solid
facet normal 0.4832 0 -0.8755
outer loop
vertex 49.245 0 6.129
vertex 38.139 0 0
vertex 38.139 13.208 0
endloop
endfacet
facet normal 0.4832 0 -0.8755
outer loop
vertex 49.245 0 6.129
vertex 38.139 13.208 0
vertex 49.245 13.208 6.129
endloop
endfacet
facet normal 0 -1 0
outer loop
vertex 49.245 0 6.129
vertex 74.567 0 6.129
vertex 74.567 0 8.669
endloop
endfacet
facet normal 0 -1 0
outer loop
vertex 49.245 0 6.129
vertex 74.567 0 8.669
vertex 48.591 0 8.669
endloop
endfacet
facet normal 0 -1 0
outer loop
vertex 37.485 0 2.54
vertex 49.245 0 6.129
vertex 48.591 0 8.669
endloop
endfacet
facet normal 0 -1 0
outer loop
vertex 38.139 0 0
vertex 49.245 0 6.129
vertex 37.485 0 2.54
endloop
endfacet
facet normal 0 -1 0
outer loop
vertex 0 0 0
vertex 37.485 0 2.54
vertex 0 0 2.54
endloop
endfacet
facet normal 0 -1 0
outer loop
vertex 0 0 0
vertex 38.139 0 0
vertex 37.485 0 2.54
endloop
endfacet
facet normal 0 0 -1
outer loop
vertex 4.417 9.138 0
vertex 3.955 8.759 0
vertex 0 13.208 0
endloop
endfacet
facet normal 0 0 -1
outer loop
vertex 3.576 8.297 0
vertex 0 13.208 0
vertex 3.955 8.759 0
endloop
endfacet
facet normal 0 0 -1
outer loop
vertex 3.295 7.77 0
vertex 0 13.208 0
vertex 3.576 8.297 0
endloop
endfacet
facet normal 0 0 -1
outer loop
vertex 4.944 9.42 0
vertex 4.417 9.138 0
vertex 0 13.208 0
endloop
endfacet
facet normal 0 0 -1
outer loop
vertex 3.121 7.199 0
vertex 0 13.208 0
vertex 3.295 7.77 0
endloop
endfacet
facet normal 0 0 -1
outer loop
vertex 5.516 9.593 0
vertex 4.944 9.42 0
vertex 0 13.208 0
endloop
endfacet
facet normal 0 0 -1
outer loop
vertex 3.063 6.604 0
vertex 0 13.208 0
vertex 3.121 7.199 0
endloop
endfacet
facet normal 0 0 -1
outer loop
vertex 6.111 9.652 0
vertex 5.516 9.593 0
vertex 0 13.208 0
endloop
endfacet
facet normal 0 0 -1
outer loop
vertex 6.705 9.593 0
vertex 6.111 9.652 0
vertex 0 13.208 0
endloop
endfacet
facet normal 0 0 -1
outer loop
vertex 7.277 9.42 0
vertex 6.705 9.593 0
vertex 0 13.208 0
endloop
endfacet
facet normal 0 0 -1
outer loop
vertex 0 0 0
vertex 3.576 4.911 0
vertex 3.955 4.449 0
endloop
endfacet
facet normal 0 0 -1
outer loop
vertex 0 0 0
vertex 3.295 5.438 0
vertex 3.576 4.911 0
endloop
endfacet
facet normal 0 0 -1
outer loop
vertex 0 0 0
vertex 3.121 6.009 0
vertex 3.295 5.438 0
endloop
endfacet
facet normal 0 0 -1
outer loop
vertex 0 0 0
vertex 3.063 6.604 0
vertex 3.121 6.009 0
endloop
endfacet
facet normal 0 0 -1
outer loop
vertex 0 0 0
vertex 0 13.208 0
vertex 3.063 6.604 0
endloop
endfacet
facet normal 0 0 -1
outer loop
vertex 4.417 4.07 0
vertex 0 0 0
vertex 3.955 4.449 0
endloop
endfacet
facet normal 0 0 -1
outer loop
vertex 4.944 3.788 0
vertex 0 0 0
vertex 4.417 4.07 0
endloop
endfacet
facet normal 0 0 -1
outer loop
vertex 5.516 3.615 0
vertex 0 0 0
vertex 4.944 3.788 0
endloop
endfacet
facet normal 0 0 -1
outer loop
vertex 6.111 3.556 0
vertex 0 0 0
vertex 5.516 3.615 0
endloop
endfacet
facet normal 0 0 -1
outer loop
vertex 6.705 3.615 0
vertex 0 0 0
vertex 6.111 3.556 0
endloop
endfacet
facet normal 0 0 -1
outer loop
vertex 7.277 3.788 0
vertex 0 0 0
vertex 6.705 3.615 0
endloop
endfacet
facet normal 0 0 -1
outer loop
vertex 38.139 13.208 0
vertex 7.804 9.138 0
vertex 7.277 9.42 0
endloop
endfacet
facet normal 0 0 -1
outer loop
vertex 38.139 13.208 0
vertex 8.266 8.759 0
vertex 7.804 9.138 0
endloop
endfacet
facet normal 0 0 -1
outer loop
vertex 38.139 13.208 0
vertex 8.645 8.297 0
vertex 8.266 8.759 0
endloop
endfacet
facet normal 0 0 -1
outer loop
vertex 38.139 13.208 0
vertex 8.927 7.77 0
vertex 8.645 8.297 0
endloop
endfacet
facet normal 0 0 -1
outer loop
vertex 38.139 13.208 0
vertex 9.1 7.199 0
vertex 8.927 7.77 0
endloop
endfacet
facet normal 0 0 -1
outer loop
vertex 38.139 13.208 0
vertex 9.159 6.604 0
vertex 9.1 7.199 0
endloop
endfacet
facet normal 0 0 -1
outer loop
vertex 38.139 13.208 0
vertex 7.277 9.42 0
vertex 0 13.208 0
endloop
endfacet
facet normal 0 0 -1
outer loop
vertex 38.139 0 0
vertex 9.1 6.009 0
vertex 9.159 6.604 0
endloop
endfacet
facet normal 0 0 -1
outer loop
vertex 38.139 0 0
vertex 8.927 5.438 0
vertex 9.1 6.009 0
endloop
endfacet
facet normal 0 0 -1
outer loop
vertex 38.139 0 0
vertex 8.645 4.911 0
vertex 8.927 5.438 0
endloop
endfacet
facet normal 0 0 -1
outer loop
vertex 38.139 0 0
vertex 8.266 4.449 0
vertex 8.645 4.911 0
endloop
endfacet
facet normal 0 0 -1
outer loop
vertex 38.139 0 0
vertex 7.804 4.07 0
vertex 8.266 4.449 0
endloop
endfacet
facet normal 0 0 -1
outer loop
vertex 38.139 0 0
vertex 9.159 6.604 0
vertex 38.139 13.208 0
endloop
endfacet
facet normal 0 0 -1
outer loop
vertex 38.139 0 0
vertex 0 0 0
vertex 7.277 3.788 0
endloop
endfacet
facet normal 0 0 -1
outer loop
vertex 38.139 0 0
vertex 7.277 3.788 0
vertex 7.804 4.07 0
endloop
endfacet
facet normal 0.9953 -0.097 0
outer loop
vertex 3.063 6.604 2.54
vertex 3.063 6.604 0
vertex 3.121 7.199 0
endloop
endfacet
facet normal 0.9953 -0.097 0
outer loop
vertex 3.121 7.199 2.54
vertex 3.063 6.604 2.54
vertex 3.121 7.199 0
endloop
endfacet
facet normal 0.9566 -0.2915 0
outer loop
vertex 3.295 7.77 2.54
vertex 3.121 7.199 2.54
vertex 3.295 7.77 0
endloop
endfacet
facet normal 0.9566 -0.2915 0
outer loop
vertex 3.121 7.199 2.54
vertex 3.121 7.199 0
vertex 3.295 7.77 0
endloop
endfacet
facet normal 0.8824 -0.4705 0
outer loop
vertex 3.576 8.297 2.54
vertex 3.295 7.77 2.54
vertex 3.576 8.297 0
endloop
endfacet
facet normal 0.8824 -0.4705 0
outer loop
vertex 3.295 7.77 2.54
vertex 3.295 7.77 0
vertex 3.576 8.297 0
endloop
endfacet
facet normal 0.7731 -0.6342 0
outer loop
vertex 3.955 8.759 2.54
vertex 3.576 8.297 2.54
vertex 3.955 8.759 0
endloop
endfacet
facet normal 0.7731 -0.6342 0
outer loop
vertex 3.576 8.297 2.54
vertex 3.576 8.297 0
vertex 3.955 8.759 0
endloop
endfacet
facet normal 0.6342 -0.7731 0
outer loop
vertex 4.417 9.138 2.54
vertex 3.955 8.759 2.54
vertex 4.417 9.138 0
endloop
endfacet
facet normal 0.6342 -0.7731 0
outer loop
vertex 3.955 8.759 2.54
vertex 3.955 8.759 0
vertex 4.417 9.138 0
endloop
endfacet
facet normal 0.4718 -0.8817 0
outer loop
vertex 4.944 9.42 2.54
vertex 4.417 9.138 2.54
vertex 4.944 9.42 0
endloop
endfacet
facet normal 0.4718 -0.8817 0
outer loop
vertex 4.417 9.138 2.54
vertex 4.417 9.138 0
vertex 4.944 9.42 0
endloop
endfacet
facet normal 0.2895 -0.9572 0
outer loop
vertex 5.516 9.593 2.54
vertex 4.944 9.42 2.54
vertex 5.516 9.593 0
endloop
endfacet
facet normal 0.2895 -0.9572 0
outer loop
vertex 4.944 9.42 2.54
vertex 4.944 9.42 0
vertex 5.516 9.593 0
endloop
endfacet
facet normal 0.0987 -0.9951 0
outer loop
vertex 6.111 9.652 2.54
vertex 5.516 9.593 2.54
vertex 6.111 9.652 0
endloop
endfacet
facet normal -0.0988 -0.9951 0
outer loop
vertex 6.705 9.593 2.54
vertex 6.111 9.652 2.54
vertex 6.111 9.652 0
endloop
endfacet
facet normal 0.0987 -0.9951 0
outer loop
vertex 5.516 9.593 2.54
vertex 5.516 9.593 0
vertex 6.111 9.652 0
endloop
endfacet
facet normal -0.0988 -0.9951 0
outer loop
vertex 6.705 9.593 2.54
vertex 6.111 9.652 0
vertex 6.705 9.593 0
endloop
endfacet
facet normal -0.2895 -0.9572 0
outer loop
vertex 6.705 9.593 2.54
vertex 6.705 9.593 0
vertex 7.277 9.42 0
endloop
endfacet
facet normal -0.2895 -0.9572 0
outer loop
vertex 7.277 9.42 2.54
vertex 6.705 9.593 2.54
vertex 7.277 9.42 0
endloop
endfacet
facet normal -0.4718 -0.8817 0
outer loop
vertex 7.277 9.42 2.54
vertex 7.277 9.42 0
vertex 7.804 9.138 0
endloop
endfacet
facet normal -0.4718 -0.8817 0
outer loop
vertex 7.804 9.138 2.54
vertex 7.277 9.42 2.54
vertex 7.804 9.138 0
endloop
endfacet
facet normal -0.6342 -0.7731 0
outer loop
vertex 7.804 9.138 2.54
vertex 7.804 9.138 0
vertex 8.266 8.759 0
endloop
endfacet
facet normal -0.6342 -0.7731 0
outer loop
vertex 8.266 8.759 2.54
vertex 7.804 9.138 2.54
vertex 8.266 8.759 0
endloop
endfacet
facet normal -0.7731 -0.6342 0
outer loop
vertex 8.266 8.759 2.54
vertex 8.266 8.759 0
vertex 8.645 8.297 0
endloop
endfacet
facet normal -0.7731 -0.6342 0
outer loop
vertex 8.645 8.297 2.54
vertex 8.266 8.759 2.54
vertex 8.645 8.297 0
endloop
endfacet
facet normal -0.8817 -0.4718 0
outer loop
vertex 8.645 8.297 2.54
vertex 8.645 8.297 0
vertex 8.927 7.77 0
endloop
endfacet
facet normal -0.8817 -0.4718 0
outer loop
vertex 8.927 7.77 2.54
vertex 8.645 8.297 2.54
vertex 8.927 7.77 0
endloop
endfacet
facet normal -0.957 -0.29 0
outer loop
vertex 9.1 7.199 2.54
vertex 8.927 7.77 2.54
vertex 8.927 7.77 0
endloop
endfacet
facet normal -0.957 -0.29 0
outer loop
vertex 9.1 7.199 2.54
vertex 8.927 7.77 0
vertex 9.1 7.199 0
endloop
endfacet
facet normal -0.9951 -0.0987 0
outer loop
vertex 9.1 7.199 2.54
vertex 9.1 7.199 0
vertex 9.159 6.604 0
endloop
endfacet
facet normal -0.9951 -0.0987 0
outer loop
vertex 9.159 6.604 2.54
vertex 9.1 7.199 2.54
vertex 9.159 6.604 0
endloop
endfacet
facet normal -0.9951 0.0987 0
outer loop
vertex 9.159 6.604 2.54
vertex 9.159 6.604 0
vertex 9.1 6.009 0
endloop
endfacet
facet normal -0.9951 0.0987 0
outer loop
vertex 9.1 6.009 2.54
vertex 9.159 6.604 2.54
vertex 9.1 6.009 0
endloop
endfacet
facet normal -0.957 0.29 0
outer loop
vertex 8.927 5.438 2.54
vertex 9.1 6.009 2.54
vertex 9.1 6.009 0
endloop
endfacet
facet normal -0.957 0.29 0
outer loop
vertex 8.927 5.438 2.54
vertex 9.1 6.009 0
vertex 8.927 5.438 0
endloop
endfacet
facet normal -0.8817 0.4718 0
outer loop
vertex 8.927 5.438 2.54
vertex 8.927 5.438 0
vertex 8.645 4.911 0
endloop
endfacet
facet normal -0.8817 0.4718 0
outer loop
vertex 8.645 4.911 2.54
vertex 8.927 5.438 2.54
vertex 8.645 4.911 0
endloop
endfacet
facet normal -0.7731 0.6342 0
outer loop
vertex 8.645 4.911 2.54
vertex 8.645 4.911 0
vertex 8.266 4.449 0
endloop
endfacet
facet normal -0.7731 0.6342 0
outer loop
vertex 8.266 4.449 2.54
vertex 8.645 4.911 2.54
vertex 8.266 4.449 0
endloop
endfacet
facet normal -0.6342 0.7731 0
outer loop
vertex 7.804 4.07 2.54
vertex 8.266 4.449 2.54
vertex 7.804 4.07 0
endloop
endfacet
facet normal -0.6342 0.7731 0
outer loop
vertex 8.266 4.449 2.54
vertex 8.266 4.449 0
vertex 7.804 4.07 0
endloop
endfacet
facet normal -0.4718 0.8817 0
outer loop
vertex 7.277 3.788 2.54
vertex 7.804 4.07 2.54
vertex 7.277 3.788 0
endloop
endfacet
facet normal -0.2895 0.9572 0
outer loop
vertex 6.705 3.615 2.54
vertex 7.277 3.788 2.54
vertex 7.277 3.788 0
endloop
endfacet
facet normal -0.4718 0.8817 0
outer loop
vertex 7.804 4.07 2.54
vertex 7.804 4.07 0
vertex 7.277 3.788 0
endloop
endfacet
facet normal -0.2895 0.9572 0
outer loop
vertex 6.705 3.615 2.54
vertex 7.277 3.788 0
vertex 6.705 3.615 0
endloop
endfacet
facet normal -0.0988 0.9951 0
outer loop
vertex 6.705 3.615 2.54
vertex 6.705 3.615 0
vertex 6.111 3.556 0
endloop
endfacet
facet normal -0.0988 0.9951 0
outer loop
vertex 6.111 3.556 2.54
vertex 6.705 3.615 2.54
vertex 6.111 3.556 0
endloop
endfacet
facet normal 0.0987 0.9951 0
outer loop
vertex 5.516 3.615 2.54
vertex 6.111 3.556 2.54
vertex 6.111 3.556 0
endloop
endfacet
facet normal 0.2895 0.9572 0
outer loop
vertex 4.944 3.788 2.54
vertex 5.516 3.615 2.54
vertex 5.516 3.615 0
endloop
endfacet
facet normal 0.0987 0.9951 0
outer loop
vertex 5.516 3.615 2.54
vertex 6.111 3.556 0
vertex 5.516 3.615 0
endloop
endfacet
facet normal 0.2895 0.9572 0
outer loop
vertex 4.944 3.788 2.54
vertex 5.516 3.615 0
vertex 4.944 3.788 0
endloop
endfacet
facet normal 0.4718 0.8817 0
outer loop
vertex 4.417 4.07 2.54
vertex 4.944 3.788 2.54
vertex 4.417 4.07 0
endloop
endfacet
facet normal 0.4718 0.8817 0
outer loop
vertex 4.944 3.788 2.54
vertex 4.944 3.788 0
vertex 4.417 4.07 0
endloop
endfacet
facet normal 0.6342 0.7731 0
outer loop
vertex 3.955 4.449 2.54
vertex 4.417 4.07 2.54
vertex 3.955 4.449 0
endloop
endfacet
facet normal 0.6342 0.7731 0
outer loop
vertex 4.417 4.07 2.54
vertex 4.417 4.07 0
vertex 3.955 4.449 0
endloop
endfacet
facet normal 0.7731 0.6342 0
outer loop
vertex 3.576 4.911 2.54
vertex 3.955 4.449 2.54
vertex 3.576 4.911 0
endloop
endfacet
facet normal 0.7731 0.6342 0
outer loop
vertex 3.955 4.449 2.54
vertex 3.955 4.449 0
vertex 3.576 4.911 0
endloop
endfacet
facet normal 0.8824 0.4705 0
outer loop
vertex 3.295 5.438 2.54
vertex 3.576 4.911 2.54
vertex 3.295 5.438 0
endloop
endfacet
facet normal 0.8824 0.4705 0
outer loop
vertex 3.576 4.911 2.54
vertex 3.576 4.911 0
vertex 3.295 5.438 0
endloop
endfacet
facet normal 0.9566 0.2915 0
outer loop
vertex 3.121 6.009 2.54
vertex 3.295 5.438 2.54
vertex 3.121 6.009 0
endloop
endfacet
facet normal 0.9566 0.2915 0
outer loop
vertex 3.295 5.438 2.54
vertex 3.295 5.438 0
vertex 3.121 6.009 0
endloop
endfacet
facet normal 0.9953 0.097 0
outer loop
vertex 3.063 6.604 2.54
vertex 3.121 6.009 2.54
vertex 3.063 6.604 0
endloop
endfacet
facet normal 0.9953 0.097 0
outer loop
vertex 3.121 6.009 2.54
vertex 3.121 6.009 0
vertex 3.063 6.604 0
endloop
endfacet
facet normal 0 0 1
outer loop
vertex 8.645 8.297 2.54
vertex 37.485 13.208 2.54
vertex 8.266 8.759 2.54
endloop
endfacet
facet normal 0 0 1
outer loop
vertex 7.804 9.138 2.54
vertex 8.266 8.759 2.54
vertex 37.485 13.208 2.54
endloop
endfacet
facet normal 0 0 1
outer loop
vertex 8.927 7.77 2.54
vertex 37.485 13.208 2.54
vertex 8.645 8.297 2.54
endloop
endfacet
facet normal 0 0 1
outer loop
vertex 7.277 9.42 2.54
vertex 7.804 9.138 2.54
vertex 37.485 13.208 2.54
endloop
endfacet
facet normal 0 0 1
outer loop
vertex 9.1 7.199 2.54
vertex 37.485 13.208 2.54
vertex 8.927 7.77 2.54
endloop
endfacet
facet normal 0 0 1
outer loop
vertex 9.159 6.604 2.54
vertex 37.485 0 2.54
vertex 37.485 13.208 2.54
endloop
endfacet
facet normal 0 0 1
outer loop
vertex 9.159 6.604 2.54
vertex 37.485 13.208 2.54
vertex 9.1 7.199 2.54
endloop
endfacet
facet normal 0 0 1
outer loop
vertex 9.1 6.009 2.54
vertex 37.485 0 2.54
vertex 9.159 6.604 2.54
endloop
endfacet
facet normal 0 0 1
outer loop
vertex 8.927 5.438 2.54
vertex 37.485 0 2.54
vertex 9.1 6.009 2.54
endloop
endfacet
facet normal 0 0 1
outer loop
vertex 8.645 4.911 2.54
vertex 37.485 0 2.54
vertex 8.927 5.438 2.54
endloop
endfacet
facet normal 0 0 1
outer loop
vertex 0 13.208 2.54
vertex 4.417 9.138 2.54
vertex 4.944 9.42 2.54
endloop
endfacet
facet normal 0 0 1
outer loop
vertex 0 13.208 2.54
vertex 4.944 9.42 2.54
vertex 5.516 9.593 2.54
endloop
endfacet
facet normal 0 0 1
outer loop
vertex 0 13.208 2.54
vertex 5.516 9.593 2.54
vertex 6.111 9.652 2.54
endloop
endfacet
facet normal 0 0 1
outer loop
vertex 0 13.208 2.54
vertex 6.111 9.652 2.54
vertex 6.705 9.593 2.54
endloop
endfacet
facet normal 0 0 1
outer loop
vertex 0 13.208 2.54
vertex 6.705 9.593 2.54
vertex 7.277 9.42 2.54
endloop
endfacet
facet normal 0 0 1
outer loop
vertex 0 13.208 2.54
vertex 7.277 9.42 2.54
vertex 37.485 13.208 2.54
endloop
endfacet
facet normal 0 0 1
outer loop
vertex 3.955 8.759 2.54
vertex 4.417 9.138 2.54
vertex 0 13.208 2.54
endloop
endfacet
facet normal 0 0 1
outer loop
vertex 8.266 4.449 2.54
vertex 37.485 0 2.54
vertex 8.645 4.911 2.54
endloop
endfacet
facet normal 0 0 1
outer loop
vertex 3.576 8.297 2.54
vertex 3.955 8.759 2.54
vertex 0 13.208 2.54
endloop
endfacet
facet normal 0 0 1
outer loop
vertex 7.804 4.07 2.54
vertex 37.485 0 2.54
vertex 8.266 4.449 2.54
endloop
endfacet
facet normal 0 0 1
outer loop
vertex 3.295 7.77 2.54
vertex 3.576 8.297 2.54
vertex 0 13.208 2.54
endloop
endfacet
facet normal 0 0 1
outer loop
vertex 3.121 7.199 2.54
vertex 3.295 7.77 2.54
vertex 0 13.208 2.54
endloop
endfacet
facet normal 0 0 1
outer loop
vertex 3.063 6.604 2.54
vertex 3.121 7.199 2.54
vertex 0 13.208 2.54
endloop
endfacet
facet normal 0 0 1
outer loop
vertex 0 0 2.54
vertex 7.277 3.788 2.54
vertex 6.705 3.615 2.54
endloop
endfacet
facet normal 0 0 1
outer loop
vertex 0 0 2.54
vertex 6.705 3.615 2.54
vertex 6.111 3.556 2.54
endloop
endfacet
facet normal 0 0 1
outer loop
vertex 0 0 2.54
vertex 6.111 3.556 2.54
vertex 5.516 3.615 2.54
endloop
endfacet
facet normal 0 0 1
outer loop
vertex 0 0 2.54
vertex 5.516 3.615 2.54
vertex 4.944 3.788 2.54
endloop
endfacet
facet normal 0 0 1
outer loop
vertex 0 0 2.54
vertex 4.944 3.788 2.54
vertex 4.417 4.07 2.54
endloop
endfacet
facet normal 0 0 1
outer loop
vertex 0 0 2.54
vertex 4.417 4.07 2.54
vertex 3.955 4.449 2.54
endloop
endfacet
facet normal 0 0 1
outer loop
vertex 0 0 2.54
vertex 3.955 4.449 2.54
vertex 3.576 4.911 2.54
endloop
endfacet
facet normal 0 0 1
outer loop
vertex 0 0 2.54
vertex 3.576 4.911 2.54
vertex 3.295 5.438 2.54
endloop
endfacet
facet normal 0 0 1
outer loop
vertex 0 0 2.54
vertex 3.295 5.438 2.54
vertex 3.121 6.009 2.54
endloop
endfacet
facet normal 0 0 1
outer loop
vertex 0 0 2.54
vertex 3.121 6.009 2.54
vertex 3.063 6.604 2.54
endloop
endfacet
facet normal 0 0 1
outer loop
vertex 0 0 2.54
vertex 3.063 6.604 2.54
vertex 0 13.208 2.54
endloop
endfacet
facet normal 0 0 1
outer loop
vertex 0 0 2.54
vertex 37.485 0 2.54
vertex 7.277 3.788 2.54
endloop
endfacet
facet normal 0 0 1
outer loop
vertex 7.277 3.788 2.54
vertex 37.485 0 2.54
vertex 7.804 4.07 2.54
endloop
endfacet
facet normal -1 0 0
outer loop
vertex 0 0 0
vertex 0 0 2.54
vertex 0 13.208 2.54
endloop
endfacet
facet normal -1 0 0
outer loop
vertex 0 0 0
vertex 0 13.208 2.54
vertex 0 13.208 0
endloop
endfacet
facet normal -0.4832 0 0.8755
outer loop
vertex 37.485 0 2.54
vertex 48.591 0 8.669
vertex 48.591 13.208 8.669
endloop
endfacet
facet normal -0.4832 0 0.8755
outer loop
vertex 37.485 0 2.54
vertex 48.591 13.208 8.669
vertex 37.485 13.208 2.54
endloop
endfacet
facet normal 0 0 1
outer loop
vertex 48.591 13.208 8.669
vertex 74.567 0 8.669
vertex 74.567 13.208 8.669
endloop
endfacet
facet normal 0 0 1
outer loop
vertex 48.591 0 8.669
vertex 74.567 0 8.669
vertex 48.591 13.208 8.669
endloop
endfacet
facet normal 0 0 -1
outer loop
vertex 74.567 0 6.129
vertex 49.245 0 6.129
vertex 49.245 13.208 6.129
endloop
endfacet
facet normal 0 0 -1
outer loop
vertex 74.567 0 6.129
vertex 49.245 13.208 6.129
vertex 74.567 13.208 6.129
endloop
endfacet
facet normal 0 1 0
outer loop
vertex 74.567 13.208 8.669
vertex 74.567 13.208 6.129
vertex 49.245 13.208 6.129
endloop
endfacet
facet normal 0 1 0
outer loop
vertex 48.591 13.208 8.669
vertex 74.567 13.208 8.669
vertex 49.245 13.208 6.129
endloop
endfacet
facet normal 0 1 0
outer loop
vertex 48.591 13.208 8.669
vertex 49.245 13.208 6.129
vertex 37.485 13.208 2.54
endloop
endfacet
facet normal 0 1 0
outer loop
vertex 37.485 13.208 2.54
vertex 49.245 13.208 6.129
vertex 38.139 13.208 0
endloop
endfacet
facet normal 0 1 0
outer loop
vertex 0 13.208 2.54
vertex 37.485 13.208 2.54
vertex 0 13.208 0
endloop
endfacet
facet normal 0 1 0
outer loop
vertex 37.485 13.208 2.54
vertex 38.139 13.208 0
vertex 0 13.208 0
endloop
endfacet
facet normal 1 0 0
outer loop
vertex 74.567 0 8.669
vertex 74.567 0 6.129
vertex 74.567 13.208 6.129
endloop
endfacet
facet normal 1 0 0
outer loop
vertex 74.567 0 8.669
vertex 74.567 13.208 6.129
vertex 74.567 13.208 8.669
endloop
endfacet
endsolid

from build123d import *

# Parameters (mm, degrees)
EXTRUDE_THIN1_DEPTH = 13.208
CUT_EXTRUDE1_REACH  = 10.669
SKETCH3_R           = 3.048


with BuildPart() as part:
    # Sketch1 → Extrude-Thin1 (new body)
    with BuildSketch(Plane(origin=(0, 0, 0), x_dir=(1, 0, 0), z_dir=(0, 1, 0))):
        Polygon((0, 0), (38.139058105, 0), (49.245270394, -6.128868698), (74.567434413, -6.128868698), (74.567434413, -8.668868698), (48.590941352, -8.668868698), (37.484729063, -2.54), (0, -2.54), align=None)
    extrude(amount=EXTRUDE_THIN1_DEPTH)

    # Sketch3 → Cut-Extrude1 (cut, up to next)
    with BuildSketch(Plane(origin=(0, 0, 0), x_dir=(-1, 0, 0), z_dir=(0, 0, -1)), mode=Mode.PRIVATE) as cut_extrude1_sk1:
        with Locations((-6.110625798, 6.604)):
            Circle(SKETCH3_R)
    cut_extrude1_tool1 = extrude(cut_extrude1_sk1.sketch, amount=-CUT_EXTRUDE1_REACH, mode=Mode.PRIVATE) & part.part
    add(cut_extrude1_tool1.solids().sort_by_distance((6.110626, 6.604, 0))[0], mode=Mode.SUBTRACT)


solid = part.part
